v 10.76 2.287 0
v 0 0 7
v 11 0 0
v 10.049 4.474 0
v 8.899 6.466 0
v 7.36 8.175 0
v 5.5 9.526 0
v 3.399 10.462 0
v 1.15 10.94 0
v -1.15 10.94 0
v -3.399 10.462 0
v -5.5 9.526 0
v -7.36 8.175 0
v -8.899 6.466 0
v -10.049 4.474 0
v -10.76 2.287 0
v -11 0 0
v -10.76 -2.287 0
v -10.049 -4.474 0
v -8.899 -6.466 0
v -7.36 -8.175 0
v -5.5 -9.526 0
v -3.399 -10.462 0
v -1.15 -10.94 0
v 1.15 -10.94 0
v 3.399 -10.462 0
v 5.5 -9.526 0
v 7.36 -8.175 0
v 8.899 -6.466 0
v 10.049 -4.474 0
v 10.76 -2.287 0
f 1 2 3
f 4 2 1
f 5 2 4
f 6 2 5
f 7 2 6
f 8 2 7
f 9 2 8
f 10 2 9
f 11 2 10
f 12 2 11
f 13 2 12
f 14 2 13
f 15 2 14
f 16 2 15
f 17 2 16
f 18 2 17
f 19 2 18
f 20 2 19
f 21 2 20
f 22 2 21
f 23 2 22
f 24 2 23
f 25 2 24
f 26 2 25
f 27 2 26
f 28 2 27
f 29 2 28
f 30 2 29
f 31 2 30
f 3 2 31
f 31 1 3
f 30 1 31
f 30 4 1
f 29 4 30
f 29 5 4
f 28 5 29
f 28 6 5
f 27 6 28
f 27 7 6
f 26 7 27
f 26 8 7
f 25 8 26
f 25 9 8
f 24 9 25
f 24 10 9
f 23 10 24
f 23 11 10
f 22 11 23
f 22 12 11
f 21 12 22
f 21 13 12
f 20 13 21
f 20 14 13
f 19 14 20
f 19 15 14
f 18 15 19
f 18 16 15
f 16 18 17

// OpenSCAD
// Generated by SolidPython 1.0.1 on 2020-07-29 00:39:25


cylinder(h = 7, r1 = 11, r2 = 0);
/***********************************************
*********      SolidPython code:      **********
************************************************
 
# import packages: SolidPython
from solid import *
from solid.utils import *
from itertools import chain, combinations


class Resize:

    def __init__(self, scad_file):
        self.scad_file = scad_file
        #self.scad_file = import_scad(scad_file)
        # cone/cylinder param:
        self.r1 = 0
        self.r2 = 0
        self.h = 0
        # rectangular prism param:
        self.w = 0
        self.l = 0
        # ellipse param:
        self.r = 0

    # import OpenScad code (file name corresponds to shape)


    # classify shape + parameters
    def assign(self, param1, param2, param3):
        if self.scad_file == 'cone.scad':
            self.r1 = param1
            self.r2 = param2
            self.h = param3
        elif self.scad_file == 'cylinder.scad':
            self.r1 = param1
            self.r2 = param2
            self.h = param3
        elif self.scad_file == 'rectangularPrism.scad':
            self.h = param1
            self.l = param2
            self.w = param3
        else:
            self.r = param1
            self.h = param2

    # resize parameters
    def iterate(self):
        x = range(3, 20, 2)
        i = 1
        if self.scad_file == 'cone.scad':
            tempList = list(combinations(x, 2))
            for temp in tempList:
                param1 = temp[0]
                param2 = temp[1]
                filepath = 'produced_scad_files/' + 'cone' + str(param1) + '_' + str(param2) + '_' + '.scad'
                scad_render_to_file(cylinder(h=param1, r1=param2, r2=0), filepath)

        elif self.scad_file == 'cylinder.scad':
            tempList = list(combinations(x, 3))
            for temp in tempList:
                param1 = temp[0]
                param2 = temp[1]
                filepath = 'produced_scad_files/' + 'cylinder' + str(param1) + '_' + str(param2) + '_' + '.scad'
                scad_render_to_file(cylinder(h=param1, r1=param2, r2=param2), filepath)

        elif self.scad_file == 'rectangularPrism.scad':
            tempList = list(combinations(x, 3))
            for temp in tempList:
                param1 = temp[0]
                param2 = temp[1]
                param3 = temp[2]
                filepath = 'produced_scad_files/' + 'rectangularPrism' + str(param1) + '_' + str(param2) + '_' + str(
                    param3) + '.scad'
                scad_render_to_file(cube(size=(param1, param2, param3)), filepath)

        elif self.scad_file == 'ellipse.scad':
            tempList = list(combinations(x, 4))
            for temp in tempList:
                param1 = temp[0]
                param2 = temp[1]
                param3 = temp[2]
                param4 = temp[3]
                filepath = 'produced_scad_files/' + 'ellipse' + str(param1) + '_' + str(param2) + '_' + str(param3) + '_' + str(param4) + '.scad'
                scad_render_to_file(scale([param1, param2, param3])(sphere(r=param4)), filepath)

    def render_to_scadfile(self):
        scad_render_to_file(scad, 'example.scad') 
 
************************************************/
